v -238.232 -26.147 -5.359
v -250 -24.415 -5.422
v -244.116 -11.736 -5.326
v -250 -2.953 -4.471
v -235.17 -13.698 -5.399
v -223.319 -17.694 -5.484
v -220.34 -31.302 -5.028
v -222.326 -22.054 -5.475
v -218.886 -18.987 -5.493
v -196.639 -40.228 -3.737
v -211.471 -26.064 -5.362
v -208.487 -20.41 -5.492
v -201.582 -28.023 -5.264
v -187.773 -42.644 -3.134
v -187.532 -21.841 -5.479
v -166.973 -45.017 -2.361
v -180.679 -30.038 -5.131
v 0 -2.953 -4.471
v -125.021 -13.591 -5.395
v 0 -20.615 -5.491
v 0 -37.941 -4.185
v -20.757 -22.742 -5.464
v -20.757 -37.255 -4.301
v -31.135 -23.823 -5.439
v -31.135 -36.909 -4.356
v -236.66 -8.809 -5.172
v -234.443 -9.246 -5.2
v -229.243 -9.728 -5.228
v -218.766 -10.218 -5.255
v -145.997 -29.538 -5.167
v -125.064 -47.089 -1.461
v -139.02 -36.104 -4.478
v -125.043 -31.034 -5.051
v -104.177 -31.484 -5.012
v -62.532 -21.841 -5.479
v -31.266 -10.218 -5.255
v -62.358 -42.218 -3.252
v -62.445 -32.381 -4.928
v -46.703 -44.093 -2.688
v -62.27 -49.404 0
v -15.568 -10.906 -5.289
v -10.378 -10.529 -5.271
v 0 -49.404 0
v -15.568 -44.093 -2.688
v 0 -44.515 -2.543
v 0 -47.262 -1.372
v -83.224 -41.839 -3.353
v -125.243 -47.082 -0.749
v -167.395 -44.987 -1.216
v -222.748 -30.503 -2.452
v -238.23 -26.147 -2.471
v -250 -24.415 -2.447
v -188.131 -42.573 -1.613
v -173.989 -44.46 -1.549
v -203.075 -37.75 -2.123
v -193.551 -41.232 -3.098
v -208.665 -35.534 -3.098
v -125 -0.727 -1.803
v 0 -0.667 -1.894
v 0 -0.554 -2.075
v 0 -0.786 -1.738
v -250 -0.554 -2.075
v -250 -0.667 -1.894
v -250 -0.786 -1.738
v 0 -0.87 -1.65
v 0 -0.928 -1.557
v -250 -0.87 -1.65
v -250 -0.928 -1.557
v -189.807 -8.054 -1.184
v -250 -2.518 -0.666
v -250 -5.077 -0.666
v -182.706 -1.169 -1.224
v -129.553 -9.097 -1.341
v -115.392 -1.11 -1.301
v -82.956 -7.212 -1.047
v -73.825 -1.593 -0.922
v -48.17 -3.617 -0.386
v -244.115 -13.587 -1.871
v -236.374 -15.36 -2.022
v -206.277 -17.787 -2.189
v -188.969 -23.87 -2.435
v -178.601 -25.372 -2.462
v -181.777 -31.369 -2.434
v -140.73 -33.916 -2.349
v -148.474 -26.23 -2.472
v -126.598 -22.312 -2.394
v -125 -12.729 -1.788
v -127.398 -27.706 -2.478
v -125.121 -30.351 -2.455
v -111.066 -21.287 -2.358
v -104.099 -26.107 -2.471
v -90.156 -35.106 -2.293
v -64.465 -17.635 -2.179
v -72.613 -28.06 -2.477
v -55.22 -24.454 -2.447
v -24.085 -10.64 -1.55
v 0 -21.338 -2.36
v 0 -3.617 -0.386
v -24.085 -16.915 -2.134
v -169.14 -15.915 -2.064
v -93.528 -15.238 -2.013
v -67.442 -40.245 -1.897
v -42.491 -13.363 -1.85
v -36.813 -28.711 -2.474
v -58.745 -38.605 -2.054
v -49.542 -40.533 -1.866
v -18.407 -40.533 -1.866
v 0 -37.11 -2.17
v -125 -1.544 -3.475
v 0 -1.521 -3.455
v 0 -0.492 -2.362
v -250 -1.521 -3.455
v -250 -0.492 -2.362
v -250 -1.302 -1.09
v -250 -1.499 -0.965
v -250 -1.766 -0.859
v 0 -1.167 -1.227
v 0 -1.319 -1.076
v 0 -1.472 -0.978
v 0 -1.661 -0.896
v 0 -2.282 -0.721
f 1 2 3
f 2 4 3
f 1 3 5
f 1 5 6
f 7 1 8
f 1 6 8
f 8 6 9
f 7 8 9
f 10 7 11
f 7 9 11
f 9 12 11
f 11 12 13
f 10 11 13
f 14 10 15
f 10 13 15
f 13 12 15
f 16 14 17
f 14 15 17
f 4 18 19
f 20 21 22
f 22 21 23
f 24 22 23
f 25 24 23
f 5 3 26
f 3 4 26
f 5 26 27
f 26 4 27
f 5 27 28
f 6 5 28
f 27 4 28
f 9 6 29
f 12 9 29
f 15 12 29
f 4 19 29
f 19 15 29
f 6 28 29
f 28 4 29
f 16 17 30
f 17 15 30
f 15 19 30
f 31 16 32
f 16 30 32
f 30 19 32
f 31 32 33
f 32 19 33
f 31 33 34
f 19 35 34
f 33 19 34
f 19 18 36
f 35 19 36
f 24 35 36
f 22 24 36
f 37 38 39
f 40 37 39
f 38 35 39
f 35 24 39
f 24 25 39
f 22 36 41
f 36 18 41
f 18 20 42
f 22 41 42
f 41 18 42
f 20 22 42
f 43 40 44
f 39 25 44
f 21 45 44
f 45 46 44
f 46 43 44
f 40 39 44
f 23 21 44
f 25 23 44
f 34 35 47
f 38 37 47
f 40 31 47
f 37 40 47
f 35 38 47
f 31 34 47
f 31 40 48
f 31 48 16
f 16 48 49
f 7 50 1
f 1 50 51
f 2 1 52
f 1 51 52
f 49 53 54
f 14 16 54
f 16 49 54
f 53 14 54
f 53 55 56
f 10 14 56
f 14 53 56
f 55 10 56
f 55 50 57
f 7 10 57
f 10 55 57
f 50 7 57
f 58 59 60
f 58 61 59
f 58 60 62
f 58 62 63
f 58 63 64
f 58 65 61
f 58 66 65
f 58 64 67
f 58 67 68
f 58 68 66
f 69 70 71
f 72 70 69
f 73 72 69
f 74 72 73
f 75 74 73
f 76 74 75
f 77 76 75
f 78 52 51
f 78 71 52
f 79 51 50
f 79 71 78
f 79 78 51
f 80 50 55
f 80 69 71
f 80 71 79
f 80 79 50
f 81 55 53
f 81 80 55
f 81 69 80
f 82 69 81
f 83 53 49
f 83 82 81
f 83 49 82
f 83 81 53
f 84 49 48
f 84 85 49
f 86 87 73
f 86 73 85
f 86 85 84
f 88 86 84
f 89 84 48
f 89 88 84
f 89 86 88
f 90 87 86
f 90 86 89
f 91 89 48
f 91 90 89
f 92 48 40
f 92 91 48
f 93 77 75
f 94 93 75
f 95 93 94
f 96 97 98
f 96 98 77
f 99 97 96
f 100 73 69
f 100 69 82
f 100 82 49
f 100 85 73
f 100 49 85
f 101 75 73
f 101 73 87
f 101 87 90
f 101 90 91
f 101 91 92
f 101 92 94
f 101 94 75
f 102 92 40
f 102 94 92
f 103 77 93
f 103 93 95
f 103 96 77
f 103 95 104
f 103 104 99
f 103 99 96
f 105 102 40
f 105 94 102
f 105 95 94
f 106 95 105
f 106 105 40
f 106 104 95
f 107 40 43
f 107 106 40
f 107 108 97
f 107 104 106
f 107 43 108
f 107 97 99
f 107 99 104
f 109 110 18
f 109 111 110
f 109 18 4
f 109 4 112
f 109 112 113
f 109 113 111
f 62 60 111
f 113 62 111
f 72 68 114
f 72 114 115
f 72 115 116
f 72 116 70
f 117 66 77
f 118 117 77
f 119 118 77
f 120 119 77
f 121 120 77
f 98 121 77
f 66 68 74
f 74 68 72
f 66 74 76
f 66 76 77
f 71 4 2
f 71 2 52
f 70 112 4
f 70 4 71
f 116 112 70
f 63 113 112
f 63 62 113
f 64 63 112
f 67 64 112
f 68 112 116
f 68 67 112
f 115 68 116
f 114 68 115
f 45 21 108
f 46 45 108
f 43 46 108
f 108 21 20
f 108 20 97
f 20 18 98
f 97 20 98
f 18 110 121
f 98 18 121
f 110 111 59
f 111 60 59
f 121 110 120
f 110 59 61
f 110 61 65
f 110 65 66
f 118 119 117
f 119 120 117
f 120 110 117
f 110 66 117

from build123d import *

# Parameters (mm, degrees)
F0_W      = 250
F0_H      = 10
F1_DEPTH  = 50
F3_DEPTH  = 30
F5_DEPTH  = 250
F7_DEPTH  = 250
F8_DEPTH  = 60
F10_DEPTH = 25
F11_DEPTH = 60


with BuildPart() as f1:
    # F0 (on Front) → F1 (new body)
    with BuildSketch(Plane.XZ):
        with Locations((-125, -0.8841458522)):
            Rectangle(F0_W, F0_H)
    extrude(amount=F1_DEPTH)

    # F2 (on Front) → F3 (cut)
    with BuildSketch(Plane.XZ):
        with BuildLine():
            Line((-313.2871612906, 5.0173905069), (-313.2871612906, 0))
            add(Edge.make_bspline(
                [(-313.2871612906, 0), (-305.7408024233, 0.2490956721), (-53.1240111215, -4.4060569761), (63.1468826879, 9.0389913046), (-305.0592132912, 4.2141648523), (-313.2871612906, 5.0173905069)],
                knots=[0, 0, 0, 0, 0.4110714895, 0.5621074239, 0.9930860809, 0.9930860809, 0.9930860809, 0.9930860809], degree=3))
        make_face()
        with BuildLine():
            add(Edge.make_bspline(
                [(-313.2871612906, 5.0173905069), (-313.4191570769, 5.0302761501), (-313.4831006394, 5.044287986), (-313.4769124275, 5.0594728428)],
                knots=[0.9930860809, 0.9930860809, 0.9930860809, 0.9930860809, 1, 1, 1, 1], degree=3))
            Line((-313.2871612906, 5.0173905069), (-313.2871612906, 8.698137477))
            Line((-313.2871612906, 8.698137477), (-313.4769124275, 5.0594728428))
        make_face()
    extrude(amount=F3_DEPTH, mode=Mode.SUBTRACT)

    # F4 (on Right) → F5 (intersect)
    with BuildSketch(Plane.YZ):
        with BuildLine():
            Line((0.5672006129, -1.3385175809), (0.1652306632, 0.2717507569))
            add(Edge.make_bspline(
                [(0.1652306632, 0.2717507569), (-3.0391772862, -0.1480424546), (-12.0919650314, -2.8128463431), (-42.1130539169, -2.9590662558), (-49.4042519617, 0)],
                knots=[0, 0, 0, 0, 0.3735616657, 1, 1, 1, 1], degree=3))
            add(Edge.make_bspline(
                [(0.6500760171, -3.4983696098), (-2.7817302159, -4.6583340632), (-10.9384602329, -5.8049870315), (-42.3045310889, -5.708930743), (-49.4042519617, 0)],
                knots=[0, 0, 0, 0, 0.3661243195, 1, 1, 1, 1], degree=3))
            Line((0.6500760171, -3.4983696098), (0.5672006129, -1.3385175809))
        make_face()
    extrude(amount=-F5_DEPTH, mode=Mode.INTERSECT)

    # F6 (on Right) → F7 (cut)
    with BuildSketch(Plane.YZ):
        with BuildLine():
            add(Edge.make_bspline(
                [(-0.3713592388, -2.284798827), (-0.2241532093, -2.2148044468), (-0.0823320886, -2.24440747), (0, -2.1551709748)],
                knots=[0.8126011445, 0.8126011445, 0.8126011445, 0.8126011445, 1, 1, 1, 1], degree=3))
            add(Edge.make_bspline(
                [(0, -2.1551709748), (-0.329754515, -2.1314787293), (-0.7120324277, -1.8268609189), (-0.9275754571, -1.5570607049)],
                knots=[0, 0, 0, 0, 0.1014973216, 0.1014973216, 0.1014973216, 0.1014973216], degree=3))
            add(Edge.make_bspline(
                [(-0.5537458841, -2.0746981376), (-0.6252984398, -1.9910490784), (-0.6912669675, -1.7880899452), (-0.8970043195, -1.6468032305), (-0.9275754571, -1.5570607049)],
                knots=[0.3180376428, 0.3180376428, 0.3180376428, 0.3180376428, 0.6602872495, 1, 1, 1, 1], degree=3))
            add(Edge.make_bspline(
                [(-0.3713592388, -2.284798827), (-0.3875660997, -2.2144380571), (-0.4872552126, -2.1524295626), (-0.5537458841, -2.0746981376)],
                knots=[0, 0, 0, 0, 0.3180376428, 0.3180376428, 0.3180376428, 0.3180376428], degree=3))
        make_face()
        with BuildLine():
            add(Edge.make_bspline(
                [(0, -2.1551709748), (0.0470843515, -2.1525380743), (0.0954787204, -2.1497884688), (0.1445713973, -2.1472855941)],
                knots=[0, 0, 0, 0, 0.0270402164, 0.0270402164, 0.0270402164, 0.0270402164], degree=3))
            add(Edge.make_bspline(
                [(0.1445713973, -2.1472855941), (0.0972920511, -2.1559836171), (0.0492313889, -2.1587081581), (0, -2.1551709748)],
                knots=[0.9848467454, 0.9848467454, 0.9848467454, 0.9848467454, 1, 1, 1, 1], degree=3))
        make_face()
        with BuildLine():
            add(Edge.make_bspline(
                [(0.1445713973, -2.1472855941), (0.0972920511, -2.1559836171), (0.0492313889, -2.1587081581), (0, -2.1551709748)],
                knots=[0.9848467454, 0.9848467454, 0.9848467454, 0.9848467454, 1, 1, 1, 1], degree=3))
            add(Edge.make_bspline(
                [(-0.3713592388, -2.284798827), (-0.2241532093, -2.2148044468), (-0.0823320886, -2.24440747), (0, -2.1551709748)],
                knots=[0.8126011445, 0.8126011445, 0.8126011445, 0.8126011445, 1, 1, 1, 1], degree=3))
            add(Edge.make_bspline(
                [(-0.4921774922, -2.3621015913), (-0.4512225519, -2.3298430813), (-0.4110947157, -2.3036924829), (-0.3713592388, -2.284798827)],
                knots=[0.7620163762, 0.7620163762, 0.7620163762, 0.7620163762, 0.8126011445, 0.8126011445, 0.8126011445, 0.8126011445], degree=3))
            add(Edge.make_bspline(
                [(-3.1840484364, -4.6814284005), (-3.0055224359, -4.4249821283), (-1.4635640249, -3.672642383), (-0.7639363061, -2.5761547519), (-0.4921774922, -2.3621015913)],
                knots=[0, 0, 0, 0, 0.4263582957, 0.7620163762, 0.7620163762, 0.7620163762, 0.7620163762], degree=3))
            add(Edge.make_bspline(
                [(0.1445713973, -2.1472855941), (0.4781031282, -2.1302812627), (1.1300747826, -2.1202709661), (1.4167482192, -2.8884793386), (-0.5860592872, -4.3606955567), (-2.8324278052, -4.9287898784), (-3.1840484364, -4.6814284005)],
                knots=[0.0270402164, 0.0270402164, 0.0270402164, 0.0270402164, 0.2107492894, 0.3545004907, 0.6749045556, 1, 1, 1, 1], degree=3))
        make_face()
        with BuildLine():
            add(Edge.make_bspline(
                [(0, -2.1551709748), (-0.329754515, -2.1314787293), (-0.7120324277, -1.8268609189), (-0.9275754571, -1.5570607049)],
                knots=[0, 0, 0, 0, 0.1014973216, 0.1014973216, 0.1014973216, 0.1014973216], degree=3))
            add(Edge.make_bspline(
                [(0, -2.1551709748), (0.0470843515, -2.1525380743), (0.0954787204, -2.1497884688), (0.1445713973, -2.1472855941)],
                knots=[0, 0, 0, 0, 0.0270402164, 0.0270402164, 0.0270402164, 0.0270402164], degree=3))
            add(Edge.make_bspline(
                [(-0.9275754571, -1.5570607049), (-1.122131781, -1.3135300375), (-1.2849738501, -0.7167346625), (-5.9739971148, -0.3185463772), (-1.2349744114, 2.4740546969), (3.3251523519, 2.2599980845), (1.1921011598, -1.2647816461), (0.4471431263, -2.091621206), (0.1445713973, -2.1472855941)],
                knots=[0.1014973216, 0.1014973216, 0.1014973216, 0.1014973216, 0.1931121877, 0.3556083607, 0.5385432189, 0.7178468592, 0.8878710721, 0.9848467454, 0.9848467454, 0.9848467454, 0.9848467454], degree=3))
        make_face()
        with BuildLine():
            add(Edge.make_bspline(
                [(-0.4921774922, -2.3621015913), (-0.4512225519, -2.3298430813), (-0.4110947157, -2.3036924829), (-0.3713592388, -2.284798827)],
                knots=[0.7620163762, 0.7620163762, 0.7620163762, 0.7620163762, 0.8126011445, 0.8126011445, 0.8126011445, 0.8126011445], degree=3))
            add(Edge.make_bspline(
                [(-0.3713592388, -2.284798827), (-0.3875660997, -2.2144380571), (-0.4872552126, -2.1524295626), (-0.5537458841, -2.0746981376)],
                knots=[0, 0, 0, 0, 0.3180376428, 0.3180376428, 0.3180376428, 0.3180376428], degree=3))
            Line((-0.5537458841, -2.0746981376), (-0.4921774922, -2.3621015913))
        make_face()
    extrude(amount=-F7_DEPTH, mode=Mode.SUBTRACT)

    # F6 (on Right) → F8 (cut)
    with BuildSketch(Plane.YZ):
        with BuildLine():
            add(Edge.make_bspline(
                [(-0.3713592388, -2.284798827), (-0.2241532093, -2.2148044468), (-0.0823320886, -2.24440747), (0, -2.1551709748)],
                knots=[0.8126011445, 0.8126011445, 0.8126011445, 0.8126011445, 1, 1, 1, 1], degree=3))
            add(Edge.make_bspline(
                [(0, -2.1551709748), (-0.329754515, -2.1314787293), (-0.7120324277, -1.8268609189), (-0.9275754571, -1.5570607049)],
                knots=[0, 0, 0, 0, 0.1014973216, 0.1014973216, 0.1014973216, 0.1014973216], degree=3))
            add(Edge.make_bspline(
                [(-0.5537458841, -2.0746981376), (-0.6252984398, -1.9910490784), (-0.6912669675, -1.7880899452), (-0.8970043195, -1.6468032305), (-0.9275754571, -1.5570607049)],
                knots=[0.3180376428, 0.3180376428, 0.3180376428, 0.3180376428, 0.6602872495, 1, 1, 1, 1], degree=3))
            add(Edge.make_bspline(
                [(-0.3713592388, -2.284798827), (-0.3875660997, -2.2144380571), (-0.4872552126, -2.1524295626), (-0.5537458841, -2.0746981376)],
                knots=[0, 0, 0, 0, 0.3180376428, 0.3180376428, 0.3180376428, 0.3180376428], degree=3))
        make_face()
        with BuildLine():
            add(Edge.make_bspline(
                [(0, -2.1551709748), (0.0470843515, -2.1525380743), (0.0954787204, -2.1497884688), (0.1445713973, -2.1472855941)],
                knots=[0, 0, 0, 0, 0.0270402164, 0.0270402164, 0.0270402164, 0.0270402164], degree=3))
            add(Edge.make_bspline(
                [(0.1445713973, -2.1472855941), (0.0972920511, -2.1559836171), (0.0492313889, -2.1587081581), (0, -2.1551709748)],
                knots=[0.9848467454, 0.9848467454, 0.9848467454, 0.9848467454, 1, 1, 1, 1], degree=3))
        make_face()
        with BuildLine():
            add(Edge.make_bspline(
                [(0.1445713973, -2.1472855941), (0.0972920511, -2.1559836171), (0.0492313889, -2.1587081581), (0, -2.1551709748)],
                knots=[0.9848467454, 0.9848467454, 0.9848467454, 0.9848467454, 1, 1, 1, 1], degree=3))
            add(Edge.make_bspline(
                [(-0.3713592388, -2.284798827), (-0.2241532093, -2.2148044468), (-0.0823320886, -2.24440747), (0, -2.1551709748)],
                knots=[0.8126011445, 0.8126011445, 0.8126011445, 0.8126011445, 1, 1, 1, 1], degree=3))
            add(Edge.make_bspline(
                [(-0.4921774922, -2.3621015913), (-0.4512225519, -2.3298430813), (-0.4110947157, -2.3036924829), (-0.3713592388, -2.284798827)],
                knots=[0.7620163762, 0.7620163762, 0.7620163762, 0.7620163762, 0.8126011445, 0.8126011445, 0.8126011445, 0.8126011445], degree=3))
            add(Edge.make_bspline(
                [(-3.1840484364, -4.6814284005), (-3.0055224359, -4.4249821283), (-1.4635640249, -3.672642383), (-0.7639363061, -2.5761547519), (-0.4921774922, -2.3621015913)],
                knots=[0, 0, 0, 0, 0.4263582957, 0.7620163762, 0.7620163762, 0.7620163762, 0.7620163762], degree=3))
            add(Edge.make_bspline(
                [(0.1445713973, -2.1472855941), (0.4781031282, -2.1302812627), (1.1300747826, -2.1202709661), (1.4167482192, -2.8884793386), (-0.5860592872, -4.3606955567), (-2.8324278052, -4.9287898784), (-3.1840484364, -4.6814284005)],
                knots=[0.0270402164, 0.0270402164, 0.0270402164, 0.0270402164, 0.2107492894, 0.3545004907, 0.6749045556, 1, 1, 1, 1], degree=3))
        make_face()
        with BuildLine():
            add(Edge.make_bspline(
                [(0, -2.1551709748), (-0.329754515, -2.1314787293), (-0.7120324277, -1.8268609189), (-0.9275754571, -1.5570607049)],
                knots=[0, 0, 0, 0, 0.1014973216, 0.1014973216, 0.1014973216, 0.1014973216], degree=3))
            add(Edge.make_bspline(
                [(0, -2.1551709748), (0.0470843515, -2.1525380743), (0.0954787204, -2.1497884688), (0.1445713973, -2.1472855941)],
                knots=[0, 0, 0, 0, 0.0270402164, 0.0270402164, 0.0270402164, 0.0270402164], degree=3))
            add(Edge.make_bspline(
                [(-0.9275754571, -1.5570607049), (-1.122131781, -1.3135300375), (-1.2849738501, -0.7167346625), (-5.9739971148, -0.3185463772), (-1.2349744114, 2.4740546969), (3.3251523519, 2.2599980845), (1.1921011598, -1.2647816461), (0.4471431263, -2.091621206), (0.1445713973, -2.1472855941)],
                knots=[0.1014973216, 0.1014973216, 0.1014973216, 0.1014973216, 0.1931121877, 0.3556083607, 0.5385432189, 0.7178468592, 0.8878710721, 0.9848467454, 0.9848467454, 0.9848467454, 0.9848467454], degree=3))
        make_face()
        with BuildLine():
            add(Edge.make_bspline(
                [(-0.4921774922, -2.3621015913), (-0.4512225519, -2.3298430813), (-0.4110947157, -2.3036924829), (-0.3713592388, -2.284798827)],
                knots=[0.7620163762, 0.7620163762, 0.7620163762, 0.7620163762, 0.8126011445, 0.8126011445, 0.8126011445, 0.8126011445], degree=3))
            add(Edge.make_bspline(
                [(-0.3713592388, -2.284798827), (-0.3875660997, -2.2144380571), (-0.4872552126, -2.1524295626), (-0.5537458841, -2.0746981376)],
                knots=[0, 0, 0, 0, 0.3180376428, 0.3180376428, 0.3180376428, 0.3180376428], degree=3))
            Line((-0.5537458841, -2.0746981376), (-0.4921774922, -2.3621015913))
        make_face()
    extrude(amount=-F8_DEPTH, mode=Mode.SUBTRACT)

    # F9 (on Top) → F10 (cut)
    with BuildSketch(Plane.XY):
        with BuildLine():
            add(Edge.make_bspline(
                [(-56.8262115121, -50.0726350397), (-54.0441875705, -48.7490632239), (-187.4004746082, -46.842235401), (-199.3512918879, -37.8274652783), (-273.5120374225, -13.0599144802), (-252.6334265377, -49.7966928991), (-249.180515691, -52.7649299347), (-237.7654494775, -53.9858025132), (-60.2588532543, -51.7057438695), (-56.8262115121, -50.0726350397)],
                knots=[0, 0, 0, 0, 0.2258560561, 0.3506417657, 0.4998497255, 0.6002929057, 0.6426859144, 0.7213241359, 1, 1, 1, 1], degree=3))
        make_face()
    extrude(amount=-F10_DEPTH, mode=Mode.SUBTRACT)

    # F6 (on Right) → F11 (cut)
    with BuildSketch(Plane.YZ):
        with BuildLine():
            add(Edge.make_bspline(
                [(-0.3713592388, -2.284798827), (-0.2241532093, -2.2148044468), (-0.0823320886, -2.24440747), (0, -2.1551709748)],
                knots=[0.8126011445, 0.8126011445, 0.8126011445, 0.8126011445, 1, 1, 1, 1], degree=3))
            add(Edge.make_bspline(
                [(0, -2.1551709748), (-0.329754515, -2.1314787293), (-0.7120324277, -1.8268609189), (-0.9275754571, -1.5570607049)],
                knots=[0, 0, 0, 0, 0.1014973216, 0.1014973216, 0.1014973216, 0.1014973216], degree=3))
            add(Edge.make_bspline(
                [(-0.5537458841, -2.0746981376), (-0.6252984398, -1.9910490784), (-0.6912669675, -1.7880899452), (-0.8970043195, -1.6468032305), (-0.9275754571, -1.5570607049)],
                knots=[0.3180376428, 0.3180376428, 0.3180376428, 0.3180376428, 0.6602872495, 1, 1, 1, 1], degree=3))
            add(Edge.make_bspline(
                [(-0.3713592388, -2.284798827), (-0.3875660997, -2.2144380571), (-0.4872552126, -2.1524295626), (-0.5537458841, -2.0746981376)],
                knots=[0, 0, 0, 0, 0.3180376428, 0.3180376428, 0.3180376428, 0.3180376428], degree=3))
        make_face()
        with BuildLine():
            add(Edge.make_bspline(
                [(0, -2.1551709748), (0.0470843515, -2.1525380743), (0.0954787204, -2.1497884688), (0.1445713973, -2.1472855941)],
                knots=[0, 0, 0, 0, 0.0270402164, 0.0270402164, 0.0270402164, 0.0270402164], degree=3))
            add(Edge.make_bspline(
                [(0.1445713973, -2.1472855941), (0.0972920511, -2.1559836171), (0.0492313889, -2.1587081581), (0, -2.1551709748)],
                knots=[0.9848467454, 0.9848467454, 0.9848467454, 0.9848467454, 1, 1, 1, 1], degree=3))
        make_face()
        with BuildLine():
            add(Edge.make_bspline(
                [(0.1445713973, -2.1472855941), (0.0972920511, -2.1559836171), (0.0492313889, -2.1587081581), (0, -2.1551709748)],
                knots=[0.9848467454, 0.9848467454, 0.9848467454, 0.9848467454, 1, 1, 1, 1], degree=3))
            add(Edge.make_bspline(
                [(-0.3713592388, -2.284798827), (-0.2241532093, -2.2148044468), (-0.0823320886, -2.24440747), (0, -2.1551709748)],
                knots=[0.8126011445, 0.8126011445, 0.8126011445, 0.8126011445, 1, 1, 1, 1], degree=3))
            add(Edge.make_bspline(
                [(-0.4921774922, -2.3621015913), (-0.4512225519, -2.3298430813), (-0.4110947157, -2.3036924829), (-0.3713592388, -2.284798827)],
                knots=[0.7620163762, 0.7620163762, 0.7620163762, 0.7620163762, 0.8126011445, 0.8126011445, 0.8126011445, 0.8126011445], degree=3))
            add(Edge.make_bspline(
                [(-3.1840484364, -4.6814284005), (-3.0055224359, -4.4249821283), (-1.4635640249, -3.672642383), (-0.7639363061, -2.5761547519), (-0.4921774922, -2.3621015913)],
                knots=[0, 0, 0, 0, 0.4263582957, 0.7620163762, 0.7620163762, 0.7620163762, 0.7620163762], degree=3))
            add(Edge.make_bspline(
                [(0.1445713973, -2.1472855941), (0.4781031282, -2.1302812627), (1.1300747826, -2.1202709661), (1.4167482192, -2.8884793386), (-0.5860592872, -4.3606955567), (-2.8324278052, -4.9287898784), (-3.1840484364, -4.6814284005)],
                knots=[0.0270402164, 0.0270402164, 0.0270402164, 0.0270402164, 0.2107492894, 0.3545004907, 0.6749045556, 1, 1, 1, 1], degree=3))
        make_face()
        with BuildLine():
            add(Edge.make_bspline(
                [(0, -2.1551709748), (-0.329754515, -2.1314787293), (-0.7120324277, -1.8268609189), (-0.9275754571, -1.5570607049)],
                knots=[0, 0, 0, 0, 0.1014973216, 0.1014973216, 0.1014973216, 0.1014973216], degree=3))
            add(Edge.make_bspline(
                [(0, -2.1551709748), (0.0470843515, -2.1525380743), (0.0954787204, -2.1497884688), (0.1445713973, -2.1472855941)],
                knots=[0, 0, 0, 0, 0.0270402164, 0.0270402164, 0.0270402164, 0.0270402164], degree=3))
            add(Edge.make_bspline(
                [(-0.9275754571, -1.5570607049), (-1.122131781, -1.3135300375), (-1.2849738501, -0.7167346625), (-5.9739971148, -0.3185463772), (-1.2349744114, 2.4740546969), (3.3251523519, 2.2599980845), (1.1921011598, -1.2647816461), (0.4471431263, -2.091621206), (0.1445713973, -2.1472855941)],
                knots=[0.1014973216, 0.1014973216, 0.1014973216, 0.1014973216, 0.1931121877, 0.3556083607, 0.5385432189, 0.7178468592, 0.8878710721, 0.9848467454, 0.9848467454, 0.9848467454, 0.9848467454], degree=3))
        make_face()
        with BuildLine():
            add(Edge.make_bspline(
                [(-0.4921774922, -2.3621015913), (-0.4512225519, -2.3298430813), (-0.4110947157, -2.3036924829), (-0.3713592388, -2.284798827)],
                knots=[0.7620163762, 0.7620163762, 0.7620163762, 0.7620163762, 0.8126011445, 0.8126011445, 0.8126011445, 0.8126011445], degree=3))
            add(Edge.make_bspline(
                [(-0.3713592388, -2.284798827), (-0.3875660997, -2.2144380571), (-0.4872552126, -2.1524295626), (-0.5537458841, -2.0746981376)],
                knots=[0, 0, 0, 0, 0.3180376428, 0.3180376428, 0.3180376428, 0.3180376428], degree=3))
            Line((-0.5537458841, -2.0746981376), (-0.4921774922, -2.3621015913))
        make_face()
    extrude(amount=-F11_DEPTH, mode=Mode.SUBTRACT)


solid = f1.part
